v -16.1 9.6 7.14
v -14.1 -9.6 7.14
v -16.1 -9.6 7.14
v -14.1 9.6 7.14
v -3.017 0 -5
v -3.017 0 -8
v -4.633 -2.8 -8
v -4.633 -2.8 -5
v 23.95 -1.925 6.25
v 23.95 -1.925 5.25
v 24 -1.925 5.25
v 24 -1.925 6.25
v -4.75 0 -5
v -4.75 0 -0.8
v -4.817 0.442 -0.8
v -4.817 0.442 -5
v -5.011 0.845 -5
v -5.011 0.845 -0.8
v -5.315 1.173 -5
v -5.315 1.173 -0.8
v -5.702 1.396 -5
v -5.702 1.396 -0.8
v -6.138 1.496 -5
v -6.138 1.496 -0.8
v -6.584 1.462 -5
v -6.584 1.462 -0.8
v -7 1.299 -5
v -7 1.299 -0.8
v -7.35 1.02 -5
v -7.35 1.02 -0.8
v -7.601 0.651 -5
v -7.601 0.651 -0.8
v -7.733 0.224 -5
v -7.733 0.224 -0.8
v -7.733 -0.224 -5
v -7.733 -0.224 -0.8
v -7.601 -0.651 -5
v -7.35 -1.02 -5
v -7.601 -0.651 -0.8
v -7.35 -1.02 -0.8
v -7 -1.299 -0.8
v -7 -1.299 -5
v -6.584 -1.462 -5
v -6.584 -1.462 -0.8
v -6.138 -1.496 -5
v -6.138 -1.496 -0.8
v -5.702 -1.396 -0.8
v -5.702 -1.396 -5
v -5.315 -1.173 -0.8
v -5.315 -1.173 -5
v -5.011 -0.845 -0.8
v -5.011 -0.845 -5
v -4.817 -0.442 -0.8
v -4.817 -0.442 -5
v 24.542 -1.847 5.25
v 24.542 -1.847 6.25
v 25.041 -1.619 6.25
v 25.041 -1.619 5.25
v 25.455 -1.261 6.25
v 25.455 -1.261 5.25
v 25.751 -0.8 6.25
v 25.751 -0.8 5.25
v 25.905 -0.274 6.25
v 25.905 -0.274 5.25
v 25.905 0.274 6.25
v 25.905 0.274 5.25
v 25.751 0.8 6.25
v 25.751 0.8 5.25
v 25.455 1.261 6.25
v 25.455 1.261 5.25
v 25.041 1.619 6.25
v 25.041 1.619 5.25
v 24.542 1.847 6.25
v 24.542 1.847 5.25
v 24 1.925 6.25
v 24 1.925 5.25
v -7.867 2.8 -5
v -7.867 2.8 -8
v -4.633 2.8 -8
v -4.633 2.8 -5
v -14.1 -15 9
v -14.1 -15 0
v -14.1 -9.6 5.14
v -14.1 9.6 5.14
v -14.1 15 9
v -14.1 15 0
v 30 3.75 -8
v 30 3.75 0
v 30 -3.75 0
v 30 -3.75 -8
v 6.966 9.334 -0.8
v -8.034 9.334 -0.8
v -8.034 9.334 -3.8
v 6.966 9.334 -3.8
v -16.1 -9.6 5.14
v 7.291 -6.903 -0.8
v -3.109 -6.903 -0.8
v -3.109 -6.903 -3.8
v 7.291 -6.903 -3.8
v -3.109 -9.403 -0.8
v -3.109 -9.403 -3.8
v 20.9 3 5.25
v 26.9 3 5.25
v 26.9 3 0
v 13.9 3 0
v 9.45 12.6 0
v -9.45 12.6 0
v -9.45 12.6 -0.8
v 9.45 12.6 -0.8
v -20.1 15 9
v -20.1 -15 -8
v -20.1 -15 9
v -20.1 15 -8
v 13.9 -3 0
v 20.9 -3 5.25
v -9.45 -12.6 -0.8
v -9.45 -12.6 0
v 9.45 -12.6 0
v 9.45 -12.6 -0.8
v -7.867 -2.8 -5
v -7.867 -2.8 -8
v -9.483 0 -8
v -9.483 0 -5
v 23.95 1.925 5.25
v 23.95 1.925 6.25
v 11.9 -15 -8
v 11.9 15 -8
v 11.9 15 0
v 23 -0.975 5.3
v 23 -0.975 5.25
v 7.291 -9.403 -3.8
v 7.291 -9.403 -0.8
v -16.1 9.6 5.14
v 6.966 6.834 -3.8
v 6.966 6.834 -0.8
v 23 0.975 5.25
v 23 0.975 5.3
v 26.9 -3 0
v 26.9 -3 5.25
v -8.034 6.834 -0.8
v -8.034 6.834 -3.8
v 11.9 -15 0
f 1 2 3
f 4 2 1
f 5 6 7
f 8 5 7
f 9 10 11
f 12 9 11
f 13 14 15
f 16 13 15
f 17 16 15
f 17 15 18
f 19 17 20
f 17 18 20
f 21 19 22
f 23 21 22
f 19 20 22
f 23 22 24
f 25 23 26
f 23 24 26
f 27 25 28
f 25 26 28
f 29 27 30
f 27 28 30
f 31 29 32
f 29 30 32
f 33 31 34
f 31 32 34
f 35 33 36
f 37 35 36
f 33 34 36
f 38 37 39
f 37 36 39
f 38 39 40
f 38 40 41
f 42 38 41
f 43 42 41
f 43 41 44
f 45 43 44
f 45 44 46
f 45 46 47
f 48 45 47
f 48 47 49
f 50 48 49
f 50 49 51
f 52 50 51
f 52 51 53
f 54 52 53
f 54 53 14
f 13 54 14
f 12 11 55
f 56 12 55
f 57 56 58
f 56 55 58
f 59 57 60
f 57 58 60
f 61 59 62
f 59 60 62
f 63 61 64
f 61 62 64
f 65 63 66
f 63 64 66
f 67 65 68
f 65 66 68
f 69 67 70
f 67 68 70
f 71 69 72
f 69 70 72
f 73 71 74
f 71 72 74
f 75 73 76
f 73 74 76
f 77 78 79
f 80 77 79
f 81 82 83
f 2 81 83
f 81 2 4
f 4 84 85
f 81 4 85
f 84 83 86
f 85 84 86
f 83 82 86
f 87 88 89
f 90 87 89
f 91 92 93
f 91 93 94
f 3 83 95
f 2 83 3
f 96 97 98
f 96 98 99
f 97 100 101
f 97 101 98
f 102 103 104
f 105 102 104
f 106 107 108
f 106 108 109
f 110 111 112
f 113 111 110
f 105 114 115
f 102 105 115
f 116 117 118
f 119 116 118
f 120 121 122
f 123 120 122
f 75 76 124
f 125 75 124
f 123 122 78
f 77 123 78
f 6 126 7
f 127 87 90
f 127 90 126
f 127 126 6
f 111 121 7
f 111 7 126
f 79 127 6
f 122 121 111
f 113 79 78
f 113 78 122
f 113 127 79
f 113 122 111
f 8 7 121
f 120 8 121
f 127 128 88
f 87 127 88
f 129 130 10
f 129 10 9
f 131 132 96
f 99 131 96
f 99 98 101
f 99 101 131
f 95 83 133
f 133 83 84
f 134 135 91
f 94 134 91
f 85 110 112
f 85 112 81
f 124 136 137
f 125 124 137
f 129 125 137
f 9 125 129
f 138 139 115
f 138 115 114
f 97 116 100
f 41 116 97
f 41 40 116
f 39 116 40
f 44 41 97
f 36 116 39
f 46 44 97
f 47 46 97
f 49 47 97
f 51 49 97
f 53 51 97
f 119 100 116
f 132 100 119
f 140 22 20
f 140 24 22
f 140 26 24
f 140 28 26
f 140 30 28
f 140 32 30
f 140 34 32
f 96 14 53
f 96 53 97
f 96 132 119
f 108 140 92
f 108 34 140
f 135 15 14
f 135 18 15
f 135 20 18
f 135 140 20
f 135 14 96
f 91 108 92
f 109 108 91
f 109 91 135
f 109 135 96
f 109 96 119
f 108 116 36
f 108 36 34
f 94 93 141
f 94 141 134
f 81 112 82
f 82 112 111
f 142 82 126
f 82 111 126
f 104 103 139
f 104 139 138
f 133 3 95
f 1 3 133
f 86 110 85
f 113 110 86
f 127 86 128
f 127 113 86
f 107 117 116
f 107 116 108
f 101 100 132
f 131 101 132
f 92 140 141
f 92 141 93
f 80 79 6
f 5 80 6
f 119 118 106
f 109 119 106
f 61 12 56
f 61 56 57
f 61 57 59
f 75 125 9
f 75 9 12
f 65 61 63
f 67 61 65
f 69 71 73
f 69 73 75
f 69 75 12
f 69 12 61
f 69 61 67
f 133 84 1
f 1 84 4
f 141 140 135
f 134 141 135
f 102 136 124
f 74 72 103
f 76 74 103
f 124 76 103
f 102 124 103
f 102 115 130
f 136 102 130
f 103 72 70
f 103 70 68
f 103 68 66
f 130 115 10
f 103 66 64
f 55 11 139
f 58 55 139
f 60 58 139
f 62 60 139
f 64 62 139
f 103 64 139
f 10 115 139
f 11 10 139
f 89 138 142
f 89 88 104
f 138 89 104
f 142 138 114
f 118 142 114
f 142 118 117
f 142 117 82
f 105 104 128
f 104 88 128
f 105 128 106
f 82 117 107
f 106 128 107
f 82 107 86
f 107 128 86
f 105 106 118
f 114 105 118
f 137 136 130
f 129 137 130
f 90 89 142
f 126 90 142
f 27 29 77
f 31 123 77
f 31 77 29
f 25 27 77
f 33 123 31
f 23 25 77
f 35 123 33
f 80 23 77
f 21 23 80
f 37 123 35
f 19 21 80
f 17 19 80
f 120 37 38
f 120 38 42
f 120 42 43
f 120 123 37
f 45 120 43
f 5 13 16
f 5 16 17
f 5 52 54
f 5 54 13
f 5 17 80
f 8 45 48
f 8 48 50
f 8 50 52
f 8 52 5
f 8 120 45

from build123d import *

# Parameters (mm, degrees)
SKETCH_R          = 1.5
PAD_DEPTH         = 8
SKETCH001_W       = 18.9
SKETCH001_H       = 25.2
POCKET_DEPTH      = 0.8
SKETCH002_W       = 15
SKETCH002_H       = 2.5
SKETCH002_W_2     = 10.4
POCKET001_DEPTH   = 3
SKETCH003_W       = 6
SKETCH003_H       = 30
PAD001_DEPTH      = 9
SKETCH004_W       = 19.2
SKETCH004_H       = 2
POCKET002_DEPTH   = 2
POCKET003_DEPTH   = 3
PAD002_DEPTH      = 3
PAD002_DEPTH_BACK = 3
PAD003_DEPTH      = 1
CHAMFER_SIZE      = 0.95


with BuildPart() as part:
    # Sketch → Pad (new body)
    with BuildSketch(Plane.XY):
        Polygon((-20.1, 15), (11.9, 15), (30, 3.75), (30, -3.75), (11.9, -15), (-20.1, -15), align=None)
        with Locations((-6.25, 0)):
            Circle(SKETCH_R, mode=Mode.SUBTRACT)
    extrude(amount=-PAD_DEPTH)

    # Sketch001 → Pocket (cut)
    with BuildSketch(Plane.XY):
        Rectangle(SKETCH001_W, SKETCH001_H)
    extrude(amount=-POCKET_DEPTH, mode=Mode.SUBTRACT)

    # Sketch002 (on Face33 of Pad003) → Pocket001 (cut)
    with BuildSketch(Plane.XY.offset(-0.8)):
        with Locations((-0.534042, 8.083783)):
            Rectangle(SKETCH002_W, SKETCH002_H)
        with Locations((2.090713, -8.153236)):
            Rectangle(SKETCH002_W_2, SKETCH002_H)
    extrude(amount=-POCKET001_DEPTH, mode=Mode.SUBTRACT)

    # Sketch003 (on Face4 of Pocket001) → Pad001 (join)
    with BuildSketch(Plane.XY):
        with Locations((-17.1, 0)):
            Rectangle(SKETCH003_W, SKETCH003_H)
    extrude(amount=PAD001_DEPTH)

    # Sketch004 (on Face10 of Pad001) → Pocket002 (cut)
    with BuildSketch(Plane.YZ.offset(-14.1)):
        with Locations((0, 6.14)):
            Rectangle(SKETCH004_W, SKETCH004_H)
    extrude(amount=-POCKET002_DEPTH, mode=Mode.SUBTRACT)

    # Sketch005 → Pocket003 (cut)
    with BuildSketch(Plane(origin=(0, 0, -8), x_dir=(1, 0, 0), z_dir=(0, 0, -1))):
        Polygon((-4.633419, 2.8), (-7.866581, 2.8), (-9.483162, 0), (-7.866581, -2.8), (-4.633419, -2.8), (-3.016838, 0), align=None)
    extrude(amount=-POCKET003_DEPTH, mode=Mode.SUBTRACT)

    # Sketch006 → Pad002 (join, two sides)
    with BuildSketch(Plane.XZ) as pad002_sk:
        Polygon((13.9, 0), (20.9, 5.25), (26.9, 5.25), (26.9, 0), align=None)
    extrude(amount=PAD002_DEPTH)
    extrude(pad002_sk.sketch, amount=-PAD002_DEPTH_BACK)

    # Sketch007 (on Face32 of Pad002) → Pad003 (join)
    with BuildSketch(Plane.XY.offset(5.25)):
        with BuildLine():
            ThreePointArc((24, -1.925), (25.925, 0), (24, 1.925))
            Line((24, 1.925), (23, 1.925))
            Line((23, 1.925), (23, -1.925))
            Line((23, -1.925), (24, -1.925))
        make_face()
    extrude(amount=PAD003_DEPTH)

    # Chamfer
    chamfer_edges = [part.edges().sort_by_distance(p)[0] for p in [
        (23, 0, 6.25),
        (23, -1.925, 5.75),
        (23, 1.925, 5.75),
    ]]
    chamfer(chamfer_edges, length=CHAMFER_SIZE)


solid = part.part
